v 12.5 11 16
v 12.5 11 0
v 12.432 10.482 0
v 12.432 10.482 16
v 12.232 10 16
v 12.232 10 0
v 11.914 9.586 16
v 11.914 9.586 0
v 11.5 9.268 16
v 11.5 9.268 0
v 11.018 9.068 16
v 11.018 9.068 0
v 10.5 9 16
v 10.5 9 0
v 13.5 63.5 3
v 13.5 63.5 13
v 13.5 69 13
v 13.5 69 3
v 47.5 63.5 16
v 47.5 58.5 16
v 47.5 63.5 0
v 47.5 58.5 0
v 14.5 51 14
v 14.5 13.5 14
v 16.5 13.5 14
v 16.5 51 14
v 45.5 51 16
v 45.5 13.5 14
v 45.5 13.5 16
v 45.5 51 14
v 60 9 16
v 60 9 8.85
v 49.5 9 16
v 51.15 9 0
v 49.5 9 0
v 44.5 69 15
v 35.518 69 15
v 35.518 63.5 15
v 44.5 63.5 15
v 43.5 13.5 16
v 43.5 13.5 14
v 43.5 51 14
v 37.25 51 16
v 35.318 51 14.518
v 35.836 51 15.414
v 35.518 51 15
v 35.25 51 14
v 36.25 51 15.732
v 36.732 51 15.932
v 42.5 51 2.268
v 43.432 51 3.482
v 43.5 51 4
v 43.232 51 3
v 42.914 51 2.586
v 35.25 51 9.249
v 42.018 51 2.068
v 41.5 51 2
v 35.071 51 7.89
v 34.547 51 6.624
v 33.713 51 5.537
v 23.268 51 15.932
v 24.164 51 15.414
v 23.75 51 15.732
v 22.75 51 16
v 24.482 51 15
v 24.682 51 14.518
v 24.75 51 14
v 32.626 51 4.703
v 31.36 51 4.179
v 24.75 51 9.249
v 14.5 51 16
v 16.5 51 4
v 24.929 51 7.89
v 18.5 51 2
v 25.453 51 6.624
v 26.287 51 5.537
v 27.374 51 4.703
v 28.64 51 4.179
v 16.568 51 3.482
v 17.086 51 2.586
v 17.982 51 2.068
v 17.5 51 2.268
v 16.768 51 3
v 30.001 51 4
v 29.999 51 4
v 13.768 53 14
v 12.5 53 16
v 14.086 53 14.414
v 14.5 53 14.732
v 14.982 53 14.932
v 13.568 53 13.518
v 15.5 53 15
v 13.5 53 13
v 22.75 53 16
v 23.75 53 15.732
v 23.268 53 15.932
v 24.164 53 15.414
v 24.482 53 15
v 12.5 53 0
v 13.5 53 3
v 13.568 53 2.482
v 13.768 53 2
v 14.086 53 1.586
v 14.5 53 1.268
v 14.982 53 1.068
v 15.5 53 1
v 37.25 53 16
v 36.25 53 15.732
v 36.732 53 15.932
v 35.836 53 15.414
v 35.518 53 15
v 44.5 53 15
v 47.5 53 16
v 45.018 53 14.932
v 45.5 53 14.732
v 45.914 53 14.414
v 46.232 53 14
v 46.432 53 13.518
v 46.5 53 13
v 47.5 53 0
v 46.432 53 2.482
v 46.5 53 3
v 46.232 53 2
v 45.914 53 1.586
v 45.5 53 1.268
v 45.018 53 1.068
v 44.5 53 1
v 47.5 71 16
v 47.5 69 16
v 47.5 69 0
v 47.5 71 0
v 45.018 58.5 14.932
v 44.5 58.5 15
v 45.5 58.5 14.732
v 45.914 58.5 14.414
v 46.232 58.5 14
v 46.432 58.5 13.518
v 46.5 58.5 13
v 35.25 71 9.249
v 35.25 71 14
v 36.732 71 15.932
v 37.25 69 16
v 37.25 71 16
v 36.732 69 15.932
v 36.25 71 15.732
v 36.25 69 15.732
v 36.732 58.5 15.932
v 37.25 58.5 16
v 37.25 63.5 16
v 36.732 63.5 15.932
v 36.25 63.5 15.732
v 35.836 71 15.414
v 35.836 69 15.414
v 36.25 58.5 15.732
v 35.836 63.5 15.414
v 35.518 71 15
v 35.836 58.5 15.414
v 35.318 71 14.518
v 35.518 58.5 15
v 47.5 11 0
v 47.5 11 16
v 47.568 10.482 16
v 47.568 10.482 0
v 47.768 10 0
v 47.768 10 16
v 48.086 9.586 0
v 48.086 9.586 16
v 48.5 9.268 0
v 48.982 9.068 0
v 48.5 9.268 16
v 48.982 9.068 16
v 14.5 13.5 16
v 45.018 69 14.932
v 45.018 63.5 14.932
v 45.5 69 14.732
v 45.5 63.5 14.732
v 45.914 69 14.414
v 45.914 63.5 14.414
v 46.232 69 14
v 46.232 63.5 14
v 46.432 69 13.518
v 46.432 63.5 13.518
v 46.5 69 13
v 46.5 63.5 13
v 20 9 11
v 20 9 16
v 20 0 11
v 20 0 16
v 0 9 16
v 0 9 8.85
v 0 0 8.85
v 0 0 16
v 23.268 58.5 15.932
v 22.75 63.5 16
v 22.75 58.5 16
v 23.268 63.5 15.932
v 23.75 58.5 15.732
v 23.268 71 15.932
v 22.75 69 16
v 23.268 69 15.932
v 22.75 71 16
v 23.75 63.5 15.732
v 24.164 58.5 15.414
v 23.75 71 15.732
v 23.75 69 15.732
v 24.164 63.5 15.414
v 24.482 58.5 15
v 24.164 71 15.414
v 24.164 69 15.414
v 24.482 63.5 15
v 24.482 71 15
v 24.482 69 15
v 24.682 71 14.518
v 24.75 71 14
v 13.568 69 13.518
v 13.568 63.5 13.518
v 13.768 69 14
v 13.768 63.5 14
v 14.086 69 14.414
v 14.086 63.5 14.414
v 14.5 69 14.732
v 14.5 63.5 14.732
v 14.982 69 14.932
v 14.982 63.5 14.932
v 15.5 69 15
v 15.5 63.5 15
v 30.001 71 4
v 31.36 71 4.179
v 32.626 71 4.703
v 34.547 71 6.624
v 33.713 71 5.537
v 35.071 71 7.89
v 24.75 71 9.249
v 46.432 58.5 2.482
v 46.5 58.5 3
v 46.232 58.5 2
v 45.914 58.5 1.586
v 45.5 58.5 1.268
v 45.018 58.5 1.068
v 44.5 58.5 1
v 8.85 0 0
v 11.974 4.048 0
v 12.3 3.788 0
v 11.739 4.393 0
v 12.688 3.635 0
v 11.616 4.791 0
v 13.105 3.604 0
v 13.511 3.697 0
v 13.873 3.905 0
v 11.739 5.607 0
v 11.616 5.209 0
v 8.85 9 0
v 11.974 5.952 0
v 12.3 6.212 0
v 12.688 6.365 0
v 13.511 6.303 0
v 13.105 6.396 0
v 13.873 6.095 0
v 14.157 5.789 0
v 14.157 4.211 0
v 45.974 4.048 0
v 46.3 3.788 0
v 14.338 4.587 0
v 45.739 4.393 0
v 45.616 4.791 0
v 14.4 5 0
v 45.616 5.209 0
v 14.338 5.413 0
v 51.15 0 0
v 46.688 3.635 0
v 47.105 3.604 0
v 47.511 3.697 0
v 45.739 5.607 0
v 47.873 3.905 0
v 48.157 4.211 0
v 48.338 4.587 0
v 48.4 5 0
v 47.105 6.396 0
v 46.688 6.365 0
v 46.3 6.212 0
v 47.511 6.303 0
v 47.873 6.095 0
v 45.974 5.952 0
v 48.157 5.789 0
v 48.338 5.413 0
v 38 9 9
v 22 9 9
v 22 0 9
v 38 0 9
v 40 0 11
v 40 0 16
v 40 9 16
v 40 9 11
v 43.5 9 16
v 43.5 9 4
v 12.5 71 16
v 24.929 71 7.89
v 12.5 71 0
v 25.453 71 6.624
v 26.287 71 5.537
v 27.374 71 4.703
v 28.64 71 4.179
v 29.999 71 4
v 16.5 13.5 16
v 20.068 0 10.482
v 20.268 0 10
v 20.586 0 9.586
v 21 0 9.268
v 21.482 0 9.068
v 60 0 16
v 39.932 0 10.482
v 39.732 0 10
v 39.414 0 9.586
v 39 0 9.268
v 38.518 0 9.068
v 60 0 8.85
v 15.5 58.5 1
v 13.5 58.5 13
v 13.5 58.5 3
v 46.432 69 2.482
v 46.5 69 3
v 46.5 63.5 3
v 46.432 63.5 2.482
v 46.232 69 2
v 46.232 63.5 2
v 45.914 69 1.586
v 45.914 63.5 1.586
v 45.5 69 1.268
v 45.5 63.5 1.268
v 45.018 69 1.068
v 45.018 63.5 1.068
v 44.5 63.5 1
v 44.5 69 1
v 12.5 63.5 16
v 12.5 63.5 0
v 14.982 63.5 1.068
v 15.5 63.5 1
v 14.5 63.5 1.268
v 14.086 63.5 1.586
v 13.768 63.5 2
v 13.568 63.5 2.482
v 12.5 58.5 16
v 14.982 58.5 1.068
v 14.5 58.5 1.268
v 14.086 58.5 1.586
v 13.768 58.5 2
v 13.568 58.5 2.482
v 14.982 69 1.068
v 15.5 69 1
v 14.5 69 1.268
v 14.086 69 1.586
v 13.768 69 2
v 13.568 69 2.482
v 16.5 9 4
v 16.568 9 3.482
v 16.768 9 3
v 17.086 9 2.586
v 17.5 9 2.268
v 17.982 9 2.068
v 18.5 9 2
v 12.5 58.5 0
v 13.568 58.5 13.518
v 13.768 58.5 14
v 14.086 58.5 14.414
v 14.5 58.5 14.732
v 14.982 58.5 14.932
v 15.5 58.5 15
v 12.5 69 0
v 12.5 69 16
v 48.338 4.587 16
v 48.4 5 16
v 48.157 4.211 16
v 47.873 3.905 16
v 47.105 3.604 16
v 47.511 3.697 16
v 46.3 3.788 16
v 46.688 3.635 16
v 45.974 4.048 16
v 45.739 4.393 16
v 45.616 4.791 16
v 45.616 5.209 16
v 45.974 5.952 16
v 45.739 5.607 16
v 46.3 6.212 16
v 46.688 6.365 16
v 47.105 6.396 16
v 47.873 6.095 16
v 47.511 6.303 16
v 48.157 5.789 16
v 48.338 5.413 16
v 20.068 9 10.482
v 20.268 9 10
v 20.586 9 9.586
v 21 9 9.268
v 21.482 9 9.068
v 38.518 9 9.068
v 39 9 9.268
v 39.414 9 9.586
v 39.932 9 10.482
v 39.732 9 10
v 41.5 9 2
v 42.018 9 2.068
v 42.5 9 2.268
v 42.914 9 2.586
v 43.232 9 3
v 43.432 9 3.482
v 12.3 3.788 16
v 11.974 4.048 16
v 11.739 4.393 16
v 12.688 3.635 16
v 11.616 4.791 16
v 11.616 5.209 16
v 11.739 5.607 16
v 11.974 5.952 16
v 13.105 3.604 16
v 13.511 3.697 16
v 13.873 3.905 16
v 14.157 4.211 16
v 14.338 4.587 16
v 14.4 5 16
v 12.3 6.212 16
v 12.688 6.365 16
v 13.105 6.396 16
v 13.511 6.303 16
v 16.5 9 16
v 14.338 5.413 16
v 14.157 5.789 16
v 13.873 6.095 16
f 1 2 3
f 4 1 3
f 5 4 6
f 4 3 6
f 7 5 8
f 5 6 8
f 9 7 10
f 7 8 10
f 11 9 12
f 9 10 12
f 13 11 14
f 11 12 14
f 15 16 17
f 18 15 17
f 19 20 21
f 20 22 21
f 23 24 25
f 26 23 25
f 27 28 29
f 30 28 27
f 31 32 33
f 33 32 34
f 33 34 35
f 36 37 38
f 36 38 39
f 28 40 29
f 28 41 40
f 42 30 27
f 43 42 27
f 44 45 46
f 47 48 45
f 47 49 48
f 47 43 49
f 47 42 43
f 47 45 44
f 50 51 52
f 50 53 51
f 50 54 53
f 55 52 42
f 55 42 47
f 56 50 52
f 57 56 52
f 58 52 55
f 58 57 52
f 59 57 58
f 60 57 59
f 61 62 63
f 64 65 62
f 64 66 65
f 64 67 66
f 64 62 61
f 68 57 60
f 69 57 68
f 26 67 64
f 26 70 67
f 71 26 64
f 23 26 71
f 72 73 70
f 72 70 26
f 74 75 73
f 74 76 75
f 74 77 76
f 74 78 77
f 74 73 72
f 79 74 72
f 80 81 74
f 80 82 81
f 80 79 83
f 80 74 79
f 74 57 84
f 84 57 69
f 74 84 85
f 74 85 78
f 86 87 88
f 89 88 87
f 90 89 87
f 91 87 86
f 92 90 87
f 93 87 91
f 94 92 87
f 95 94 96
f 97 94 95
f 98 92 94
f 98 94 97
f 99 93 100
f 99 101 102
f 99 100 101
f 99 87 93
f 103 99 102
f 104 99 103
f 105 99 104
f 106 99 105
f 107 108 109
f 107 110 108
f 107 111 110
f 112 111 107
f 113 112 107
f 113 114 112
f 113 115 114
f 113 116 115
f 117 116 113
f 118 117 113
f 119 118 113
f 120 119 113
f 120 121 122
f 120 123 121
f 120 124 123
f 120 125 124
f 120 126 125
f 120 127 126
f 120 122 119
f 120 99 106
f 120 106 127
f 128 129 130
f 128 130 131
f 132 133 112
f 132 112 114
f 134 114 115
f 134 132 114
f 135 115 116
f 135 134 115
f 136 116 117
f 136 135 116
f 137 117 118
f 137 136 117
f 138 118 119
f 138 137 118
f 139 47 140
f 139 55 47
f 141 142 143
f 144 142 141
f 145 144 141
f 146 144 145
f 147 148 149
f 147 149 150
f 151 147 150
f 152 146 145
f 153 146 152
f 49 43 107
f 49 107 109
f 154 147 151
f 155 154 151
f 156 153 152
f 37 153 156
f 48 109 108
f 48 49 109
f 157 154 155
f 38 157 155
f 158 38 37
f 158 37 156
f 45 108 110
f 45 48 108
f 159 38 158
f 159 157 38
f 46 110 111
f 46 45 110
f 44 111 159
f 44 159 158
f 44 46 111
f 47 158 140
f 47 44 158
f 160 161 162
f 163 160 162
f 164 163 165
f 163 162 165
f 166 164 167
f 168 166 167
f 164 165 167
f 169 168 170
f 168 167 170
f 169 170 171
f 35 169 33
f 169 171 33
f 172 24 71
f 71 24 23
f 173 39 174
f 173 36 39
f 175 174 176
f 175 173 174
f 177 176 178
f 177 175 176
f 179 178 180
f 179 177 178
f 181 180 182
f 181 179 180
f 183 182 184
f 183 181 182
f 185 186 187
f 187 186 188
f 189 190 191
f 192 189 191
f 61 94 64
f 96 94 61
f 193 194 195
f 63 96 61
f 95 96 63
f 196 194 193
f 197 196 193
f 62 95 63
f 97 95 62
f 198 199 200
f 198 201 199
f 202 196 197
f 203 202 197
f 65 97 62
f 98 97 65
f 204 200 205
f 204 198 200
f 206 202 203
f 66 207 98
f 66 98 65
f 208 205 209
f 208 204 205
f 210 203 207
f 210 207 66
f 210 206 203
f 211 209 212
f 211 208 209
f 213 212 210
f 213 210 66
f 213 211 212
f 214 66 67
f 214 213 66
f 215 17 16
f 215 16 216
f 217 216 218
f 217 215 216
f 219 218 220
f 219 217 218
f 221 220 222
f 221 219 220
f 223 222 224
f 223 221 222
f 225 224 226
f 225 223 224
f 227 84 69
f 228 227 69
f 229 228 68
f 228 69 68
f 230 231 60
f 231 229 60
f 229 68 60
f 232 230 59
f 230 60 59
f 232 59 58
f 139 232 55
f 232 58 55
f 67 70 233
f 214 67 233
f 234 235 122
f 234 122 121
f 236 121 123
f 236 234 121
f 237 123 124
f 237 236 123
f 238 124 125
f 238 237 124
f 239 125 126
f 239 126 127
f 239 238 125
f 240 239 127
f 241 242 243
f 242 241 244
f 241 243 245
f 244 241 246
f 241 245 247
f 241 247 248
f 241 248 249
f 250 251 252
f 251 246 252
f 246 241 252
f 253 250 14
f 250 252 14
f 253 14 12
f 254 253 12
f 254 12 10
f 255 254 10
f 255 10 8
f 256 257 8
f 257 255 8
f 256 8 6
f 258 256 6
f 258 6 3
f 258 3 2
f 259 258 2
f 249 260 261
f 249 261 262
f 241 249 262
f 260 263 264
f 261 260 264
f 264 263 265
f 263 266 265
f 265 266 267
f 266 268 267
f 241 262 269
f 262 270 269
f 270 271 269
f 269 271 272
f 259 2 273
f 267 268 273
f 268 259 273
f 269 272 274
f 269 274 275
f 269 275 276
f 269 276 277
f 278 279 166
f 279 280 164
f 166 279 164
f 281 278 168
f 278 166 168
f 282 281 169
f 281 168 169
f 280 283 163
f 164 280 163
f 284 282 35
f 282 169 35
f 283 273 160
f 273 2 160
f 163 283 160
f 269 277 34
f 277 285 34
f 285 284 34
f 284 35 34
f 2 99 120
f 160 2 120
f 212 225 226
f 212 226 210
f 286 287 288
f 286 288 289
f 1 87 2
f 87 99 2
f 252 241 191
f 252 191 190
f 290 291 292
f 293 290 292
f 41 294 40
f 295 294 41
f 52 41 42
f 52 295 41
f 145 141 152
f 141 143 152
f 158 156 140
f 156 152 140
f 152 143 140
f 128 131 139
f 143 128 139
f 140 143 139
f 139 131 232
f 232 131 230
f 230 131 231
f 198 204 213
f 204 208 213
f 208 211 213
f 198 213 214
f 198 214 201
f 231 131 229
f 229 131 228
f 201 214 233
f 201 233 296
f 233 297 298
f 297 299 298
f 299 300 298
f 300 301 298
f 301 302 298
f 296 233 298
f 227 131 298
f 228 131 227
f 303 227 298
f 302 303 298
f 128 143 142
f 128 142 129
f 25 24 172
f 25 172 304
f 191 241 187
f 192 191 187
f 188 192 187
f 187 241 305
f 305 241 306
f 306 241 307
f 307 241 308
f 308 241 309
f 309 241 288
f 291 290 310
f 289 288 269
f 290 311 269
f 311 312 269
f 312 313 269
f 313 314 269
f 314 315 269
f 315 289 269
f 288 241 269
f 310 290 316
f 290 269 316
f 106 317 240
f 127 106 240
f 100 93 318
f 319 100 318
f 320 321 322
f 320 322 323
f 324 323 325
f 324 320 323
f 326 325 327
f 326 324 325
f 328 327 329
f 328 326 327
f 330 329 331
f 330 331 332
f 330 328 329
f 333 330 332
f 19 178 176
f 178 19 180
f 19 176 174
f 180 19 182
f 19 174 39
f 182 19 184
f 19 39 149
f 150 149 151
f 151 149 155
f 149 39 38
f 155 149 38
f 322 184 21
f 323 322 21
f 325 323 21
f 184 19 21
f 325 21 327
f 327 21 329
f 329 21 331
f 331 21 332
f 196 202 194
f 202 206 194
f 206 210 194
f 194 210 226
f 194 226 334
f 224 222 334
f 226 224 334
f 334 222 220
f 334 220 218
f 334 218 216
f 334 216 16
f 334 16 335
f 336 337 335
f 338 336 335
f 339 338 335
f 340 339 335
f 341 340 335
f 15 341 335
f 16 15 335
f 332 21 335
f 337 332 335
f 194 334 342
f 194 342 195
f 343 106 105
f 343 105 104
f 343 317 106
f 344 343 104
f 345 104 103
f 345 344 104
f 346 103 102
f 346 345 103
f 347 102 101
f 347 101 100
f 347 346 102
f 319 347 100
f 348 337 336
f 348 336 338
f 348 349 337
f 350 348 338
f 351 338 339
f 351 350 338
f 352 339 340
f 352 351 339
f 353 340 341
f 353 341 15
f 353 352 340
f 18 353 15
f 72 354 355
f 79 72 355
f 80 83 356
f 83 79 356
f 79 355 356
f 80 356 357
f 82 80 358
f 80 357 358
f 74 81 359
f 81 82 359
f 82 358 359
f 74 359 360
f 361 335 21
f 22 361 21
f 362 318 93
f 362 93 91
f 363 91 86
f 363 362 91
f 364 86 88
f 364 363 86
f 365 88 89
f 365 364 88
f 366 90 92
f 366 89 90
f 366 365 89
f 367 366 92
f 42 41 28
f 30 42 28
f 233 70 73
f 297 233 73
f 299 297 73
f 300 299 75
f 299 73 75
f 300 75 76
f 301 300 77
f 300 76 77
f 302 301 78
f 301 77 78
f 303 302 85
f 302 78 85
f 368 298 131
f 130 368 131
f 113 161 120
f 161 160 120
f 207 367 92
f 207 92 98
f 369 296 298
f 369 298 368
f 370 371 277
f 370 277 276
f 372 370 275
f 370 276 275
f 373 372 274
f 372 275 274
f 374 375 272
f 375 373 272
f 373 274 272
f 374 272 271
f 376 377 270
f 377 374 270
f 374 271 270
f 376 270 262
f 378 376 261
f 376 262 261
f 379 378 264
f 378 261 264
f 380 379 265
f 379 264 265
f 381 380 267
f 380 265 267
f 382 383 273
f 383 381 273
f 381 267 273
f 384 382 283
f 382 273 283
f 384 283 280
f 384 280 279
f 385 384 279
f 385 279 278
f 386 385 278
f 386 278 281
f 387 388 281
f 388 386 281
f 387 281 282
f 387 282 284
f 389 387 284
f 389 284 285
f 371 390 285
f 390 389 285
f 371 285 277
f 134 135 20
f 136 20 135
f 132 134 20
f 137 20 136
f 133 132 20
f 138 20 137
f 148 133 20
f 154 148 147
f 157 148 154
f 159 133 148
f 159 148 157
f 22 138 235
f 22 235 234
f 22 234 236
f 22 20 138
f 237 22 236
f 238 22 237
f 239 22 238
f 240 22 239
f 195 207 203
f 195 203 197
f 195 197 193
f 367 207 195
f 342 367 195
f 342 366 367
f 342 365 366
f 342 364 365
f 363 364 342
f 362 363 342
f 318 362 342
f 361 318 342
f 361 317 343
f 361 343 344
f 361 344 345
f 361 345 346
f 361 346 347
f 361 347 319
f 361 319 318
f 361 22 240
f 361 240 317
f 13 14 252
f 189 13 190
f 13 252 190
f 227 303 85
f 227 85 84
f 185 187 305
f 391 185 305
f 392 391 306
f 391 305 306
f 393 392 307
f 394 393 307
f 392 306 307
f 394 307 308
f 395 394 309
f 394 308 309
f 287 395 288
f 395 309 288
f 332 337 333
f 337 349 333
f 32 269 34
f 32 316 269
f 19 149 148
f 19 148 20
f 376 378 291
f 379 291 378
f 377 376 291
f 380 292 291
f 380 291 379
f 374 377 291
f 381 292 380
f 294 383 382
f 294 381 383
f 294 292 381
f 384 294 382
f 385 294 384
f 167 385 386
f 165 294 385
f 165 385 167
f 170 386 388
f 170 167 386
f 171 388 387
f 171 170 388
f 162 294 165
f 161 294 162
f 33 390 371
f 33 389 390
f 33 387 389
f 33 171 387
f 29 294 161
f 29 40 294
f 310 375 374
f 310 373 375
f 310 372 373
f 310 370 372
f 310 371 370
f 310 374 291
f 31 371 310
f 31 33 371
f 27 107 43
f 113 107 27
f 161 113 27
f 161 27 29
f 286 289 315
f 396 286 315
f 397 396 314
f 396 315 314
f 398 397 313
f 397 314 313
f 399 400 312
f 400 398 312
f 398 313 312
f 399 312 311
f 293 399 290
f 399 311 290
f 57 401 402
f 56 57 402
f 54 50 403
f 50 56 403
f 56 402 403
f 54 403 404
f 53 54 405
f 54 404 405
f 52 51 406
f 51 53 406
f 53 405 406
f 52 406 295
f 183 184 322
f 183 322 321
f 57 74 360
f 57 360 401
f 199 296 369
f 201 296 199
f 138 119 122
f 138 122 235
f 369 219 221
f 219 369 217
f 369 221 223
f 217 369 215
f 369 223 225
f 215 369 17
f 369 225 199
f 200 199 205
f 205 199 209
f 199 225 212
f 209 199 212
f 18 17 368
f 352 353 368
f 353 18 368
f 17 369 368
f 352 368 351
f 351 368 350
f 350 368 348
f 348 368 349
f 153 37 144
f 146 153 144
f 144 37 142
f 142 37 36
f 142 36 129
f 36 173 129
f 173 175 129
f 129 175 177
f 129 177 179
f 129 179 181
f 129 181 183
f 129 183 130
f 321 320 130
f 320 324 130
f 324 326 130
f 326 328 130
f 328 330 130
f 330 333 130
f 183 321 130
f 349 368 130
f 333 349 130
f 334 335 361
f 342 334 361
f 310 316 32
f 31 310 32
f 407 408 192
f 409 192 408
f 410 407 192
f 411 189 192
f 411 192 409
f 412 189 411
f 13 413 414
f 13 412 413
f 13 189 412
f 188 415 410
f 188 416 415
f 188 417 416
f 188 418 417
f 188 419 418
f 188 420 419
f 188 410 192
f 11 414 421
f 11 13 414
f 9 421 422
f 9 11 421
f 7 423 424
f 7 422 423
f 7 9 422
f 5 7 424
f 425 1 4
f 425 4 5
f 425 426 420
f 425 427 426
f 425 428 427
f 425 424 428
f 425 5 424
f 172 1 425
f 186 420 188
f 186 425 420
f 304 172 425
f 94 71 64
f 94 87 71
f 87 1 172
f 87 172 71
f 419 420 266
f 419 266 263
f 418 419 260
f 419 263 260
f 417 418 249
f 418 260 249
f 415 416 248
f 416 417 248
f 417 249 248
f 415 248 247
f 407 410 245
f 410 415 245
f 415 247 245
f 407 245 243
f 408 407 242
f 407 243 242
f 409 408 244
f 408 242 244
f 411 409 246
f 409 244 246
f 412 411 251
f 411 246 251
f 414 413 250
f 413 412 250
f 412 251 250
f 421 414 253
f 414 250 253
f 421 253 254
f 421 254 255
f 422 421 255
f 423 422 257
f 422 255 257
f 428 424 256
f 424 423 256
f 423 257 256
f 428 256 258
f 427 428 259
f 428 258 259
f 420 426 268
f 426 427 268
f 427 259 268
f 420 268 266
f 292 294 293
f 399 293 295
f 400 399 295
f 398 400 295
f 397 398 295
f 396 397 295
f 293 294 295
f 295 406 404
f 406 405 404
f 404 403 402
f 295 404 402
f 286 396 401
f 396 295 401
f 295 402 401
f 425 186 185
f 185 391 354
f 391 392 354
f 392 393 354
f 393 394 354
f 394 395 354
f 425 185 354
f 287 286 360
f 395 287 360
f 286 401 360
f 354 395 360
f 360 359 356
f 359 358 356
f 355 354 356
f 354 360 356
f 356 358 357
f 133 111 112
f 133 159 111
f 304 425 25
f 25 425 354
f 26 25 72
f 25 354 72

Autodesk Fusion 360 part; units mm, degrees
sketch "Sketch1" plane through (0, 0, 0) normal (0, 0, 1) x (1, 0, 0)
  line L0 (0, 0) -> (60, 0)
  line L1 (60, 0) -> (60, 9)
  line L2 (60, 9) -> (0, 9)
  line L3 (0, 9) -> (0, 0)
  line L4 (12.5, 9) -> (47.5, 9)
  line L5 (47.5, 9) -> (47.5, 51)
  line L6 (47.5, 51) -> (12.5, 51)
  line L7 (12.5, 51) -> (12.5, 9)
  line L8 (30, 9) -> (30, 0) construction
  line L9 (30, 51) -> (30, 9) construction
  line L10 (14.5, 9) -> (14.5, 51)
  line L11 (45.5, 9) -> (45.5, 51)
  line L12 (16.5, 9) -> (16.5, 51)
  line L13 (43.5, 9) -> (43.5, 51)
  line L14 (20.75, 51) -> (39.25, 51)
  line L15 (39.25, 51) -> (39.25, 71)
  line L16 (39.25, 71) -> (20.75, 71)
  line L17 (20.75, 71) -> (20.75, 51)
  line L18 (35.25, 51) -> (35.25, 71)
  line L19 (24.75, 51) -> (24.75, 71)
  line L20 (14.5, 9) -> (46, 9)
  line L21 (46, 9) -> (46, 7)
  line L22 (46, 7) -> (14.5, 7)
  line L23 (14.5, 7) -> (14.5, 9)
  line L24 (39.25, 71) -> (47.5, 71)
  line L25 (47.5, 71) -> (47.5, 51)
  line L26 (47.5, 51) -> (39.25, 51)
  line L27 (39.25, 51) -> (39.25, 71)
  line L28 (20.75, 71) -> (12.5, 71)
  line L29 (12.5, 71) -> (12.5, 51)
  line L30 (12.5, 51) -> (20.75, 51)
  line L31 (20.75, 51) -> (20.75, 71)
  line L32 (47.5, 58.5) -> (12.5, 58.5)
  line L33 (12.5, 53) -> (47.5, 53)
  line L34 (47.5, 63.5) -> (12.5, 63.5)
  line L35 (12.5, 69) -> (47.5, 69)
  line L36 (46.5, 51) -> (46.5, 71)
  line L37 (13.5, 51) -> (13.5, 71)
  line L38 (47.5, 9) -> (47.5, 0) construction
  line L39 (12.5, 9) -> (12.5, 0) construction
  line L40 (60, 5) -> (0, 5) construction
  line L41 (20, 0) -> (40, 0)
  line L42 (40, 0) -> (40, 10.5)
  line L43 (40, 10.5) -> (20, 10.5)
  line L44 (20, 10.5) -> (20, 0)
  line L45 (12.5, 13.5) -> (47.5, 13.5)
  line L46 (47, 9) -> (47, 0) construction
  line L47 (13, 9) -> (13, 0) construction
  circle A0 centre (47, 5) radius 1.4
  circle A1 centre (13, 5) radius 1.4
  dimension "d1" = 60
  dimension "d2" = 9
  dimension "d3" = 35
  dimension "d4" = 42
  dimension "d8" = 2
  dimension "d9" = 2
  dimension "d10" = 4
  dimension "d11" = 4
  dimension "d27" = 18.5
  dimension "d28" = 20
  dimension "d29" = 9.25
  dimension "d34" = 4
  dimension "d35" = 4
  dimension "d45" = 2
  dimension "d49" = 1
  dimension "d50" = 1
  dimension "d51" = 5.5
  dimension "d52" = 2
  dimension "d53" = 5.5
  dimension "d54" = 2
  dimension "d66" = 5
  dimension "d74" = 20
  dimension "d75" = 10.5
  dimension "d76" = 10
  dimension "d80" = 4.5
  dimension "d82" = 34
  dimension "d83" = 17
  dimension "d84" = 2.8
  dimension "d85" = 2.8
extrude "Extrude1" add sketch "Sketch1" along normal blind 16 contours L0 L2 L3 L4 L22 L23 L44 | L0 L22 L41 L42 L44 | L0 L1 L2 L4 L21 L22 L42 | L2 L4 L20 L22 L42 L44 | L2 L4 L20 L22 L23 L44 | L2 L4 L20 L21 L22 L42
extrude "Extrude2" add sketch "Sketch1" along normal blind 2 contours L2 L4 L7 L10 L45 | L2 L4 L20 L42 L43 L44 | L2 L4 L12 L13 L20 L42 L43 L44 L45 | L2 L4 L10 L12 L20 L45 | L6 L7 L10 L30 L45 | L6 L10 L12 L30 L45 | L2 L4 L5 L11 L20 L45 | L2 L4 L11 L13 L20 L45 | L6 L12 L13 L14 L26 L30 L45 | L5 L6 L11 L26 L45 | L6 L11 L13 L26 L45
extrude "Extrude5" add sketch "Sketch1" along normal up to surface (16 mm away) contours L2 L4 L7 L10 L45 | L2 L4 L10 L12 L20 L45 | L6 L7 L10 L30 L45 | L6 L10 L12 L30 L45 | L2 L4 L5 L11 L20 L45 | L2 L4 L11 L13 L20 L45 | L5 L6 L11 L26 L45 | L6 L11 L13 L26 L45
extrude "Extrude6" cut sketch "Sketch1" along normal blind 2 from surface at 14 contours L6 L10 L12 L30 L45 | L6 L11 L13 L26 L45
extrude "Extrude7" add sketch "Sketch1" along normal blind 4 contours L6 L14 L17 L19 L31 L33 | L17 L19 L31 L32 L33 | L6 L14 L15 L18 L27 L33 | L6 L14 L18 L19 L33 | L17 L19 L31 L32 L34 | L18 L19 L32 L33 | L15 L18 L27 L32 L33 | L17 L19 L31 L34 L35 | L18 L19 L32 L34 | L15 L18 L27 L32 L34 | L16 L17 L19 L31 L35 | L18 L19 L34 L35 | L15 L18 L27 L34 L35 | L16 L18 L19 L35 | L15 L16 L18 L27 L35
extrude "Extrude8" add sketch "Sketch1" along normal blind 16 contours L6 L29 L30 L33 L37 | L6 L17 L30 L31 L33 L37 | L29 L32 L33 L37 | L17 L31 L32 L33 L37 | L29 L32 L34 L37 | L6 L25 L26 L33 L36 | L6 L15 L26 L27 L33 L36 | L6 L14 L17 L19 L31 L33 | L17 L19 L31 L32 L33 | L17 L31 L32 L34 L37 | L29 L34 L35 L37 | L25 L32 L33 L36 | L6 L14 L15 L18 L27 L33 | L17 L19 L31 L32 L34 | L17 L31 L34 L35 L37 | L28 L29 L35 L37 | L15 L27 L32 L33 L36 | L25 L32 L34 L36 | L15 L18 L27 L32 L33 | L17 L19 L31 L34 L35 | L17 L28 L31 L35 L37 | L15 L27 L32 L34 L36 | L25 L34 L35 L36 | L15 L18 L27 L32 L34 | L16 L17 L19 L31 L35 | L15 L27 L34 L35 L36 | L24 L25 L35 L36 | L15 L18 L27 L34 L35 | L15 L24 L27 L35 L36 | L15 L16 L18 L27 L35
extrude "Extrude10" cut sketch "Sketch1" along normal up to surface (16 mm away) contours L29 L32 L33 L37 | L29 L34 L35 L37 | L25 L32 L33 L36 | L25 L34 L35 L36
extrude "Extrude11" cut sketch "Sketch1" against normal blind 1 from surface at 16 contours L17 L31 L32 L33 L37 | L17 L19 L31 L32 L33 | L18 L19 L32 L33 | L17 L31 L34 L35 L37 | L15 L27 L32 L33 L36 | L15 L18 L27 L32 L33 | L17 L19 L31 L34 L35 | L18 L19 L34 L35 | L15 L27 L34 L35 L36 | L15 L18 L27 L34 L35
extrude "Extrude12" cut sketch "Sketch1" along normal blind 1 contours L17 L31 L32 L33 L37 | L17 L19 L31 L32 L33 | L18 L19 L32 L33 | L17 L31 L34 L35 L37 | L15 L27 L32 L33 L36 | L15 L18 L27 L32 L33 | L17 L19 L31 L34 L35 | L18 L19 L34 L35 | L15 L27 L34 L35 L36 | L15 L18 L27 L34 L35
extrude "Extrude13" cut sketch "Sketch1" along normal up to surface (16 mm away) contours A0 | A1
extrude "Extrude14" cut sketch "Sketch1" against normal blind 7 from surface at 16 contours L0 L22 L41 L42 L44 | L2 L4 L20 L22 L42 L44
fillet "Fillet3" radius 5.25 2 edges at (35.25, 61, 4) (24.75, 61, 4)
fillet "Fillet4" radius 2 2 edges at (43.5, 30, 2) (16.5, 30, 2)
fillet "Fillet4" radius 2 2 edges at (20, 4.5, 9) (40, 4.5, 9)
fillet "Fillet7" radius 2 10 edges at (24.75, 52, 16) (24.75, 55.75, 15) (24.75, 61, 16) (24.75, 66.25, 15) (24.75, 70, 16) (35.25, 70, 16) (35.25, 66.25, 15) (35.25, 61, 16) (35.25, 55.75, 15) (35.25, 52, 16)
fillet "Fillet7" radius 2 8 edges at (46.5, 55.75, 15) (46.5, 66.25, 15) (46.5, 55.75, 1) (46.5, 66.25, 1) (13.5, 55.75, 1) (13.5, 66.25, 1) (13.5, 66.25, 15) (13.5, 55.75, 15)
fillet "Fillet8" radius 2 2 edges at (12.5, 9, 8) (47.5, 9, 8)
chamfer "Chamfer1" distance 8.85 angle 45 2 edges at (60, 4.5, 0) (0, 4.5, 0)
